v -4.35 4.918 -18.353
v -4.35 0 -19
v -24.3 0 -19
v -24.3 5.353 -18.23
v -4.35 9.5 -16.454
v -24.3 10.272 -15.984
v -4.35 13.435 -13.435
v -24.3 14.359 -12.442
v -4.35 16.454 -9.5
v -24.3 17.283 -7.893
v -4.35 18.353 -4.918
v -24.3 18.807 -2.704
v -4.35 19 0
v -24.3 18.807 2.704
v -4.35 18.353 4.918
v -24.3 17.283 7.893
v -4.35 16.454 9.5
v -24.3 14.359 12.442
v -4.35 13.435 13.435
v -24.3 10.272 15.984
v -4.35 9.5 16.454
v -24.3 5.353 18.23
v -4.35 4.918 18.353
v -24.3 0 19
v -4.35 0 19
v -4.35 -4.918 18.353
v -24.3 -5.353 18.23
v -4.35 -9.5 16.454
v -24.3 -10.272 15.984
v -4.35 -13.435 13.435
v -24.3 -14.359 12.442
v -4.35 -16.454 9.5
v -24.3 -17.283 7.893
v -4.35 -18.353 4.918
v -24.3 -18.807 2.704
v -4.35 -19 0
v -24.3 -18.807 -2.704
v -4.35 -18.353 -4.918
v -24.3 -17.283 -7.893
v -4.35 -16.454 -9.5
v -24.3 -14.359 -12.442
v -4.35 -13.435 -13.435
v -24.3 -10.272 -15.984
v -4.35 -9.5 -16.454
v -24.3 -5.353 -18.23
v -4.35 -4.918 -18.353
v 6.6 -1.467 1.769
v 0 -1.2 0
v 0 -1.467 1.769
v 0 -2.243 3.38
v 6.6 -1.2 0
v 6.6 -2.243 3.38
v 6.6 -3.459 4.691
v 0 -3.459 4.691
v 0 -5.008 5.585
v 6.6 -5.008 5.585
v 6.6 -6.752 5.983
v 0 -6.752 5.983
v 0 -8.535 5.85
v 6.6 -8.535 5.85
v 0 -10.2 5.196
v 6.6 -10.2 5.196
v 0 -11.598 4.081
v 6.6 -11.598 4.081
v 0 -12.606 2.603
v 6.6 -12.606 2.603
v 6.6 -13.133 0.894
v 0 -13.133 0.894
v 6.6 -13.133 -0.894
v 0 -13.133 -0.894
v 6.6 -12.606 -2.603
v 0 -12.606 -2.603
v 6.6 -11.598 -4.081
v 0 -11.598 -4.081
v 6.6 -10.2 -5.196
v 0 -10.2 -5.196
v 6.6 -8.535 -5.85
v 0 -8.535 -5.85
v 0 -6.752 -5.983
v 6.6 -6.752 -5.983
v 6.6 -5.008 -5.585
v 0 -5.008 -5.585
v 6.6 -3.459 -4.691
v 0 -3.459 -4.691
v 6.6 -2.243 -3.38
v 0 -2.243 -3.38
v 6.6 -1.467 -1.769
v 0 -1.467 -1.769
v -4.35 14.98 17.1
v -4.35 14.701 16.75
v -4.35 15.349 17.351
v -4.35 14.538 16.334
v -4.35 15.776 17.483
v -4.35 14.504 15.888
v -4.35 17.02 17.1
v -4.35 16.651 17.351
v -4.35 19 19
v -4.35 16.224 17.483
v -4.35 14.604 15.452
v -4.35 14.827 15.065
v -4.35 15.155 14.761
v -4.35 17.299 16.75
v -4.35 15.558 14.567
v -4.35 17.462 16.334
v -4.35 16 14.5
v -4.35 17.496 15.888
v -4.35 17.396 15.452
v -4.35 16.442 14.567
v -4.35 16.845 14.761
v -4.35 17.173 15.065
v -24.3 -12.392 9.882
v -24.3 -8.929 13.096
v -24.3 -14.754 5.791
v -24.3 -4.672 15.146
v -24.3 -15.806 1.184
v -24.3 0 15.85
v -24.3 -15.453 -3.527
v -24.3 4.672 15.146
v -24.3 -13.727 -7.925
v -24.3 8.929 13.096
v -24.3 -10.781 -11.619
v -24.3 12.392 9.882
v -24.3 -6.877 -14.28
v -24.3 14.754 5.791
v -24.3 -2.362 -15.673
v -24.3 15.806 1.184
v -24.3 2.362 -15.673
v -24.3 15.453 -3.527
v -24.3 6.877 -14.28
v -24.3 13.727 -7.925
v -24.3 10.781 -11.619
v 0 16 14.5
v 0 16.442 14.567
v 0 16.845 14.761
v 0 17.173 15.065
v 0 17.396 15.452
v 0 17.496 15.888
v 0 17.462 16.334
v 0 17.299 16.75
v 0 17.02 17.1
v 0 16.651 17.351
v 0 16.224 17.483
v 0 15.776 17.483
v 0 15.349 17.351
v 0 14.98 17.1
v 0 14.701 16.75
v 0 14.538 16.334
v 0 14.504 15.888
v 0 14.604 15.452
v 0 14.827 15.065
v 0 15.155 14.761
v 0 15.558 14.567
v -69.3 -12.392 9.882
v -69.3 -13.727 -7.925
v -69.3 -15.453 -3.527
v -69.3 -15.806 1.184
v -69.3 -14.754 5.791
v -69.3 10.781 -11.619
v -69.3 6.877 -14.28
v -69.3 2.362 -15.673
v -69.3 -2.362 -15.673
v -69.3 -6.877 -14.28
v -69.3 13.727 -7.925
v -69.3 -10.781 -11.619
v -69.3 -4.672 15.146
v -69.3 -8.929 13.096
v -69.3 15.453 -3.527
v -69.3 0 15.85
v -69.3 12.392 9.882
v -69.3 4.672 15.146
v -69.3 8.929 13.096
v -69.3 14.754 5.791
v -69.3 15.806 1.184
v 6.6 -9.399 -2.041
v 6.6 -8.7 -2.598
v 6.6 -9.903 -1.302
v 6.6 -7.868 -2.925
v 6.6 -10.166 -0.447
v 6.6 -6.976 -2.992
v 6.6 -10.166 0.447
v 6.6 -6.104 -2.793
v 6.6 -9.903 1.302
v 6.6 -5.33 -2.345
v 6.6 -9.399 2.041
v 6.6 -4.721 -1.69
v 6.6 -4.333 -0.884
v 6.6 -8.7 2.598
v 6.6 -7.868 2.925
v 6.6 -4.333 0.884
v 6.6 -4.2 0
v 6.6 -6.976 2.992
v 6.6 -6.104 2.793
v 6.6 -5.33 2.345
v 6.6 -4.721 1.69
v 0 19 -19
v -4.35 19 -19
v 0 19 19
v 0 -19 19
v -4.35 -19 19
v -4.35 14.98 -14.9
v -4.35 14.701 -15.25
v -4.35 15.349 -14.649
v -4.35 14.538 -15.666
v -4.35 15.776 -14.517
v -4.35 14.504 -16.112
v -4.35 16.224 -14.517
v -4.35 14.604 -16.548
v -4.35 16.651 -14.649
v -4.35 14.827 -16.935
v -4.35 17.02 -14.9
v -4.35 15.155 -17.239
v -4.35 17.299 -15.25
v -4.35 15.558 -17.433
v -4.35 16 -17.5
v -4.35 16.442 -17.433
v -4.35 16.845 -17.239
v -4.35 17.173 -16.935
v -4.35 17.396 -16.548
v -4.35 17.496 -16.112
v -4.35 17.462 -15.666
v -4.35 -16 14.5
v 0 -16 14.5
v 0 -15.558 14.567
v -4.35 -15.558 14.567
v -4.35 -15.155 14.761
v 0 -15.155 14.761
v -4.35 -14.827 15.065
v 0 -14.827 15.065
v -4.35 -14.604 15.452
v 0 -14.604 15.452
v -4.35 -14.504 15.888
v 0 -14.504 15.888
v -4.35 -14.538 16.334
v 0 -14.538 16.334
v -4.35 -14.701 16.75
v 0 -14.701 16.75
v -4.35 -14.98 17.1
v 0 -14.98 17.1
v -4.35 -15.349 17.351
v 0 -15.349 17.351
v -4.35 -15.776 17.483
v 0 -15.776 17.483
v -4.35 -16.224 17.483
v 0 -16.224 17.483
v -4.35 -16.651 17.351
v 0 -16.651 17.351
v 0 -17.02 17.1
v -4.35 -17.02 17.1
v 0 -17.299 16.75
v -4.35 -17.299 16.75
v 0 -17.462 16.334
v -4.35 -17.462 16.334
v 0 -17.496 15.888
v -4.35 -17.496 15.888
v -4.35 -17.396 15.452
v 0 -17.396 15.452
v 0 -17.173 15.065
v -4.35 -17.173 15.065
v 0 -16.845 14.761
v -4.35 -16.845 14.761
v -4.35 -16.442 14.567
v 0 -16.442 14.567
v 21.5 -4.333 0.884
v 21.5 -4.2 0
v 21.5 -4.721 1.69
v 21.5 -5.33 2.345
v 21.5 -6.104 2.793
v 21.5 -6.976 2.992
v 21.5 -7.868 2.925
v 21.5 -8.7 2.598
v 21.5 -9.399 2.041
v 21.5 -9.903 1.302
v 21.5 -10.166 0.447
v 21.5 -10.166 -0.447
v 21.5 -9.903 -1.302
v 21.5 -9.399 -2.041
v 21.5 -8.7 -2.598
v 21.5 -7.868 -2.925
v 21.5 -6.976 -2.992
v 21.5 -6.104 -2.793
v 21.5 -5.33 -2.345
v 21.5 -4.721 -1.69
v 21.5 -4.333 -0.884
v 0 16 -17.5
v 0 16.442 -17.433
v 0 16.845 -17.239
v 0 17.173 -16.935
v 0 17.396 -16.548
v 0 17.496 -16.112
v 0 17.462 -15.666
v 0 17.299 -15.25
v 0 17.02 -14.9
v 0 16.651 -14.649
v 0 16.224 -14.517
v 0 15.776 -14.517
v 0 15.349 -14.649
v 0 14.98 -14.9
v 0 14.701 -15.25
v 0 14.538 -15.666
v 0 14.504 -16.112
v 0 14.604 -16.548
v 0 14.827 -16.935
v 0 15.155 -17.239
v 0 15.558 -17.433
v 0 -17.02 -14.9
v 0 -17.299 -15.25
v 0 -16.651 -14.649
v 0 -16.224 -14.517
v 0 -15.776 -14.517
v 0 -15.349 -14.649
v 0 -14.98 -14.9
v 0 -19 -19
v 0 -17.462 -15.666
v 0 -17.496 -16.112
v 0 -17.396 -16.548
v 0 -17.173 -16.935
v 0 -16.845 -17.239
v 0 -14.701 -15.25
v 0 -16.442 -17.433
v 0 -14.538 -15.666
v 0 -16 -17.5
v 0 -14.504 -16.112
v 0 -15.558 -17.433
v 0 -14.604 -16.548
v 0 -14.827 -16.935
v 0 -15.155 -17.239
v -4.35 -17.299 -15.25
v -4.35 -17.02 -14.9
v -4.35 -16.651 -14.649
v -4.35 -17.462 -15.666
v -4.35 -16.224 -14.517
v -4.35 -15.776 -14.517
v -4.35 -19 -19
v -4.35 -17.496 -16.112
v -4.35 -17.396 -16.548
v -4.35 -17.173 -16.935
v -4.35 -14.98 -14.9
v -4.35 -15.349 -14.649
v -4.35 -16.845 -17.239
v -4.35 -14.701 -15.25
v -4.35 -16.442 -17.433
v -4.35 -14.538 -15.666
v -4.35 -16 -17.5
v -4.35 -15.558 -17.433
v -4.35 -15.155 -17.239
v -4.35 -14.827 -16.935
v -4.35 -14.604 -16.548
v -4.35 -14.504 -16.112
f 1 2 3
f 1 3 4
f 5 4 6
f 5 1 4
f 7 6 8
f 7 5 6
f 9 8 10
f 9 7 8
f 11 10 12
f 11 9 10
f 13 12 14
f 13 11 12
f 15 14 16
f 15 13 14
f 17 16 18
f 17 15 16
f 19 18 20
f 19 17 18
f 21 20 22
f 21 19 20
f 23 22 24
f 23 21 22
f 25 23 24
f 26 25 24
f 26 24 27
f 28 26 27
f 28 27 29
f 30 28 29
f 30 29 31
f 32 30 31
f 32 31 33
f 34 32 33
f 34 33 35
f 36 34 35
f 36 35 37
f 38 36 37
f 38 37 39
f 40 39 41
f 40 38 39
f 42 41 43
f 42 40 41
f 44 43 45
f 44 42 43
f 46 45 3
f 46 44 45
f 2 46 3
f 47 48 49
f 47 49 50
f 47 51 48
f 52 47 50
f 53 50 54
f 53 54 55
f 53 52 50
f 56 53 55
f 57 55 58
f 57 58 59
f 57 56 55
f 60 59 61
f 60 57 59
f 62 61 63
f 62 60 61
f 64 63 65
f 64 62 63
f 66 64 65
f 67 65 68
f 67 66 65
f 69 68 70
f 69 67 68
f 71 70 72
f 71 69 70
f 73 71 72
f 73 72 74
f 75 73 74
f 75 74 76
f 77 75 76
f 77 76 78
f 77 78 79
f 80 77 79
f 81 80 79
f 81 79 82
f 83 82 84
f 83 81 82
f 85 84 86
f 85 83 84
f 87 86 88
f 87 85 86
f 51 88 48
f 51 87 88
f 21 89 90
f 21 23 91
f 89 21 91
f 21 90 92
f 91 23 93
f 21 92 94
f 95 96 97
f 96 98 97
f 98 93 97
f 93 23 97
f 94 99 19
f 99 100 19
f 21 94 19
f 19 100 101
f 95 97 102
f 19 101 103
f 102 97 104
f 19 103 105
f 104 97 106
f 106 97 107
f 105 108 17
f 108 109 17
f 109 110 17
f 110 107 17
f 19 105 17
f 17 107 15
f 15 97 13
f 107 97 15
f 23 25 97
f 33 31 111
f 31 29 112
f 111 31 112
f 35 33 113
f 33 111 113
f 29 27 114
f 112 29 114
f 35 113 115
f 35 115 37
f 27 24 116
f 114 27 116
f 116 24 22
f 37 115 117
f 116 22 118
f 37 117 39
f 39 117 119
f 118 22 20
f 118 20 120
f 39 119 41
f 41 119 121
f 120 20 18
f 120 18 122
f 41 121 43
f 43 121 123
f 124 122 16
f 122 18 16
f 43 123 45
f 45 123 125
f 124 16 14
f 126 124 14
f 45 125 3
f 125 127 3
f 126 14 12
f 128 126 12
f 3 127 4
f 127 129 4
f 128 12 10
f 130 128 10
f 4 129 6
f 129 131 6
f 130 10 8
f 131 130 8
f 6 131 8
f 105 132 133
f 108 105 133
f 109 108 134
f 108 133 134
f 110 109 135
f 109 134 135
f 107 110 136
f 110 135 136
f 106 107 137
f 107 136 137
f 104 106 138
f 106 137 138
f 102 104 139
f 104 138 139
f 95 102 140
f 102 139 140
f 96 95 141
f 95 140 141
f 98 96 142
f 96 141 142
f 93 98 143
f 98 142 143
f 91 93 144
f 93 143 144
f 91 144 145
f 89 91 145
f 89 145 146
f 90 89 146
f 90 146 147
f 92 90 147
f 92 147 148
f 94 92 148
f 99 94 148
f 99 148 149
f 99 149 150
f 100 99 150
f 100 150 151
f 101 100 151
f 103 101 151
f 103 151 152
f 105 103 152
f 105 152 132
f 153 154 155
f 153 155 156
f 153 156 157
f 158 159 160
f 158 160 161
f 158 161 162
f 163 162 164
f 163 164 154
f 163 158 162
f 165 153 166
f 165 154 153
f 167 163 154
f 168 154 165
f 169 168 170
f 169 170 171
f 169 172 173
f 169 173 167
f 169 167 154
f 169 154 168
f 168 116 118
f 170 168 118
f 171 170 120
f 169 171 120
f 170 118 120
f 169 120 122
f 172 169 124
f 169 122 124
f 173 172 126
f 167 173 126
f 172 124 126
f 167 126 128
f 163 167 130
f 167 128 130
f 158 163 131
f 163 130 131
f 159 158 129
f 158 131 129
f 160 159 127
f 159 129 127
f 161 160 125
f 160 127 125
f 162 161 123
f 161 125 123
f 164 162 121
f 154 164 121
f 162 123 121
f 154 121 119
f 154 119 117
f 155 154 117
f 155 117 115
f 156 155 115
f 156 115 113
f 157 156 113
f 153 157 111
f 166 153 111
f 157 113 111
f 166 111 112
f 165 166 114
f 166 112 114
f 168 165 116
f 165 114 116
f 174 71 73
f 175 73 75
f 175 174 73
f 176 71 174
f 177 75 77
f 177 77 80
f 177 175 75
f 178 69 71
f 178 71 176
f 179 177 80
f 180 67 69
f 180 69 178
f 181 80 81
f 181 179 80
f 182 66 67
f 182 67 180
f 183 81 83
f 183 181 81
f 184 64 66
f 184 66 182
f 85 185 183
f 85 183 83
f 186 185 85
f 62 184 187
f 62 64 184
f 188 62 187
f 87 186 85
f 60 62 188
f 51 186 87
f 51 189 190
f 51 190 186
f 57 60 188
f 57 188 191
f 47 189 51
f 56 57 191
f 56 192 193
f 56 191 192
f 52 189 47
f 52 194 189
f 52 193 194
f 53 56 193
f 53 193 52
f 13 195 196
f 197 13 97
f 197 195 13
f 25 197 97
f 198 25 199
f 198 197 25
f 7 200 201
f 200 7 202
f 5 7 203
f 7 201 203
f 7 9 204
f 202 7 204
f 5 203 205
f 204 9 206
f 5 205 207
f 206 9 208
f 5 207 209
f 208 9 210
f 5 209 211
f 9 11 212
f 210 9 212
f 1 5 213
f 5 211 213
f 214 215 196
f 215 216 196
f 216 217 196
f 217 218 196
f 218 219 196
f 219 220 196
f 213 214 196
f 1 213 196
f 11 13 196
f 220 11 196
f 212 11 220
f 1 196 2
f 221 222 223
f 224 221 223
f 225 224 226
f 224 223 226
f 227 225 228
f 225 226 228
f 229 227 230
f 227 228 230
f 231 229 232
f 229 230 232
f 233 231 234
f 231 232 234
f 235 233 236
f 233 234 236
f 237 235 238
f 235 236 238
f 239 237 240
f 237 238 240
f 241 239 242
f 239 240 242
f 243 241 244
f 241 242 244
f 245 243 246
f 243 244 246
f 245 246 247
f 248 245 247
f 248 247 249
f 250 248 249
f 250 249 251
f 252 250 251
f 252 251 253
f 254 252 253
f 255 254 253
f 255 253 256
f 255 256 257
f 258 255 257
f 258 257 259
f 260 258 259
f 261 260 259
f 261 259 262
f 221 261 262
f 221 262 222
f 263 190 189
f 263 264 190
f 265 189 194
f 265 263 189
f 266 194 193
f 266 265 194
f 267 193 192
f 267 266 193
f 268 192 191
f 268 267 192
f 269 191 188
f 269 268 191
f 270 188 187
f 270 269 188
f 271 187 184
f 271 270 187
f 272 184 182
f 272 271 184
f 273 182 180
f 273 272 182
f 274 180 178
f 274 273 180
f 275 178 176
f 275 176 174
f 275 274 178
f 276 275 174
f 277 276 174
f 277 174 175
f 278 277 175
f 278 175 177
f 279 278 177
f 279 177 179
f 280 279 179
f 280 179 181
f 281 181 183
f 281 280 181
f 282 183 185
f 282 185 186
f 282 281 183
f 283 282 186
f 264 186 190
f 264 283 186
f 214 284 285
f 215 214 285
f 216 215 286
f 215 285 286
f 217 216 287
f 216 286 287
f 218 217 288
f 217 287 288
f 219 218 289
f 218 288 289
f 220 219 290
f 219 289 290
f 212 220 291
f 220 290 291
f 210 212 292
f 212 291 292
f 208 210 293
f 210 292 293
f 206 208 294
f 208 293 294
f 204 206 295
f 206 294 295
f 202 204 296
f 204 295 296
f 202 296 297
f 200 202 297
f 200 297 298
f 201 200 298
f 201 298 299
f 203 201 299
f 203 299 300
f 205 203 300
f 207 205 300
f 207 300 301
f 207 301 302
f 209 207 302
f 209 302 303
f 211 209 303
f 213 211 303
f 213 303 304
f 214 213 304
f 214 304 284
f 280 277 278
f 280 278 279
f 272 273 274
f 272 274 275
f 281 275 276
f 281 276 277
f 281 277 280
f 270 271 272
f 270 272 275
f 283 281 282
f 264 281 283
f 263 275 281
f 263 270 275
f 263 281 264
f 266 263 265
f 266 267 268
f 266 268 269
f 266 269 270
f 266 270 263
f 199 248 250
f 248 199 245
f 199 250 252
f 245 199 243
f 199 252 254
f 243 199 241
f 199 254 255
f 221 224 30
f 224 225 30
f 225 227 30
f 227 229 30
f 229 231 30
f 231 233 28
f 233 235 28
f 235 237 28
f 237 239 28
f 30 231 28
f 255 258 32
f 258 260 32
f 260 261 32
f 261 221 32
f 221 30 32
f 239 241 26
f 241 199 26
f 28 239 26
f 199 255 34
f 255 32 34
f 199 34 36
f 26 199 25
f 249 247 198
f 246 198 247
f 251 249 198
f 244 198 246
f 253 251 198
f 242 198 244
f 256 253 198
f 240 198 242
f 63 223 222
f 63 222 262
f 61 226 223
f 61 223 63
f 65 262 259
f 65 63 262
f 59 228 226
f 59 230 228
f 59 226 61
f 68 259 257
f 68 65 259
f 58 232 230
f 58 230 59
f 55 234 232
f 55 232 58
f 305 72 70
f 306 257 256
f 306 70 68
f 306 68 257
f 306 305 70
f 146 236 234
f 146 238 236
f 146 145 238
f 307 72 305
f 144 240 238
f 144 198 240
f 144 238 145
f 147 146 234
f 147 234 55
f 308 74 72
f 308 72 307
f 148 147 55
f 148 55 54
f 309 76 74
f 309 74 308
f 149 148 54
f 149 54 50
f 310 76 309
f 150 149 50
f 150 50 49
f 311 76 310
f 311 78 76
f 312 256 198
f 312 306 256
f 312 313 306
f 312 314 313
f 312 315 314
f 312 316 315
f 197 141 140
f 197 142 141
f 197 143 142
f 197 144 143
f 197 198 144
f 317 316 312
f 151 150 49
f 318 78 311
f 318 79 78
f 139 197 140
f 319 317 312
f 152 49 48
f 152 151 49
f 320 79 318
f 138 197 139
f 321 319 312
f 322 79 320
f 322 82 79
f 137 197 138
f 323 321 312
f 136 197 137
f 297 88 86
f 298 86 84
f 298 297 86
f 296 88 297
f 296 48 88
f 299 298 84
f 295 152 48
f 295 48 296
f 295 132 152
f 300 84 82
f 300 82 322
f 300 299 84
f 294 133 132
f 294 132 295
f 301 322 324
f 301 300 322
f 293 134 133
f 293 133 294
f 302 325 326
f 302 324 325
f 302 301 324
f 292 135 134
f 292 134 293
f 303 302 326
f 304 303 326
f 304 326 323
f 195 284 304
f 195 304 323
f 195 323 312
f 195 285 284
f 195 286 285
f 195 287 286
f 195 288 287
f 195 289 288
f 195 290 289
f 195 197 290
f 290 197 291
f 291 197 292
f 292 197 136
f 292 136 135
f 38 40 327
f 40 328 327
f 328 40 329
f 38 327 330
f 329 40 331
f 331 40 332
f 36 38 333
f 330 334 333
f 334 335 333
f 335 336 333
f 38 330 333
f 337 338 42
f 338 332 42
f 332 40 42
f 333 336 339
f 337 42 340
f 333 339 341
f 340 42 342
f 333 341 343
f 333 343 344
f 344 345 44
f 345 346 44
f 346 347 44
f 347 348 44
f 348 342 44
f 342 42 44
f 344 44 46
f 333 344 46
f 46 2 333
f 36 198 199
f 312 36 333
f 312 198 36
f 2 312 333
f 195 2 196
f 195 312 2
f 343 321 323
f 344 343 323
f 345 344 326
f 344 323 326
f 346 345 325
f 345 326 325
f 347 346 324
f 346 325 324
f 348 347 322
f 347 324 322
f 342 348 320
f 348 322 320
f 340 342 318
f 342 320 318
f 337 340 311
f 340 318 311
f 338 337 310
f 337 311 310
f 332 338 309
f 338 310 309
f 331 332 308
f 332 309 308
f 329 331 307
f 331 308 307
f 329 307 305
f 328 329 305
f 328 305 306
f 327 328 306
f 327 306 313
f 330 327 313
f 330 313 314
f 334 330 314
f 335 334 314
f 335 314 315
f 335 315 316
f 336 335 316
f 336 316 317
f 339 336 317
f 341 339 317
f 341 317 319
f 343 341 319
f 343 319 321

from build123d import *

# Parameters (mm, degrees)
BOSS_EXTRUDE1_DEPTH   = 24.3
BOSS_EXTRUDE2_DEPTH   = 4.35
SKETCH2_R             = 15.85
BOSS_EXTRUDE3_DEPTH   = 45
CORTE_EXTRUS_O1_REACH = 76.327
ESBO_O3_R             = 1.5


with BuildPart() as part:
    # Sketch1 → Boss-Extrude1 (new body)
    with BuildSketch(Plane(origin=(0, 0, 0), x_dir=(0, 0, -1), z_dir=(1, 0, 0))):
        with BuildLine():
            ThreePointArc((19, 0), (13.435028855, 13.43502883), (3.5e-08, 19))
            ThreePointArc((3.5e-08, 19), (-13.435028834, 13.435028851), (-19, -9e-09))
            ThreePointArc((-19, -9e-09), (-13.435028829, -13.435028856), (2.8e-08, -19))
            ThreePointArc((2.8e-08, -19), (13.435028852, -13.435028833), (19, 0))
        make_face()
    extrude(amount=-BOSS_EXTRUDE1_DEPTH)

    # Sketch1<3> → Boss-Extrude2 (add)
    with BuildSketch(Plane(origin=(0, 0, 0), x_dir=(0, 0, -1), z_dir=(1, 0, 0))):
        with BuildLine():
            Line((3.5e-08, 19), (-19, 19))
            Line((-19, 19), (-19, -9e-09))
            ThreePointArc((-19, -9e-09), (-13.435028834, 13.435028851), (3.5e-08, 19))
        make_face()
        with BuildLine():
            Line((19, 19), (3.5e-08, 19))
            ThreePointArc((3.5e-08, 19), (13.435028855, 13.43502883), (19, 0))
            Line((19, 0), (19, 19))
        make_face()
        with BuildLine():
            ThreePointArc((2.8e-08, -19), (-13.435028829, -13.435028856), (-19, -9e-09))
            Line((-19, -9e-09), (-19, -19))
            Line((-19, -19), (2.8e-08, -19))
        make_face()
        with BuildLine():
            Line((19, -19), (19, 0))
            ThreePointArc((19, 0), (13.435028852, -13.435028833), (2.8e-08, -19))
            Line((2.8e-08, -19), (19, -19))
        make_face()
    extrude(amount=-BOSS_EXTRUDE2_DEPTH)

    # Sketch2 → Boss-Extrude3 (add)
    with BuildSketch(Plane.ZY.offset(24.3)):
        Circle(SKETCH2_R)
    extrude(amount=BOSS_EXTRUDE3_DEPTH)

    # Esboço2 → Revolução1 (revolve)
    with BuildSketch(Plane.XY):
        Polygon((0, -1.2), (6.6, -1.2), (6.6, -4.2), (21.5, -4.2), (21.5, -7.2), (0, -7.2), align=None)
    revolve(axis=Axis((0, -7.2, 0), (1, 0, 0)))

    # Esboço3 → Corte-extrusão1 (cut, up to next)
    with BuildSketch(Plane(origin=(0, 0, 0), x_dir=(0, 0, -1), z_dir=(1, 0, 0)), mode=Mode.PRIVATE) as corte_extrus_o1_sk1:
        with Locations((-16, 16)):
            Circle(ESBO_O3_R)
    corte_extrus_o1_tool1 = extrude(corte_extrus_o1_sk1.sketch, amount=-CORTE_EXTRUS_O1_REACH, mode=Mode.PRIVATE) & part.part
    # Esboço3 → Corte-extrusão1 (cut, up to next)
    with BuildSketch(Plane(origin=(0, 0, 0), x_dir=(0, 0, -1), z_dir=(1, 0, 0)), mode=Mode.PRIVATE) as corte_extrus_o1_sk2:
        with Locations((16, 16)):
            Circle(ESBO_O3_R)
    corte_extrus_o1_tool2 = extrude(corte_extrus_o1_sk2.sketch, amount=-CORTE_EXTRUS_O1_REACH, mode=Mode.PRIVATE) & part.part
    # Esboço3 → Corte-extrusão1 (cut, up to next)
    with BuildSketch(Plane(origin=(0, 0, 0), x_dir=(0, 0, -1), z_dir=(1, 0, 0)), mode=Mode.PRIVATE) as corte_extrus_o1_sk3:
        with Locations((16, -16)):
            Circle(ESBO_O3_R)
    corte_extrus_o1_tool3 = extrude(corte_extrus_o1_sk3.sketch, amount=-CORTE_EXTRUS_O1_REACH, mode=Mode.PRIVATE) & part.part
    # Esboço3 → Corte-extrusão1 (cut, up to next)
    with BuildSketch(Plane(origin=(0, 0, 0), x_dir=(0, 0, -1), z_dir=(1, 0, 0)), mode=Mode.PRIVATE) as corte_extrus_o1_sk4:
        with Locations((-16, -16)):
            Circle(ESBO_O3_R)
    corte_extrus_o1_tool4 = extrude(corte_extrus_o1_sk4.sketch, amount=-CORTE_EXTRUS_O1_REACH, mode=Mode.PRIVATE) & part.part
    add(corte_extrus_o1_tool1.solids().sort_by_distance((0, 16, 16))[0], mode=Mode.SUBTRACT)
    add(corte_extrus_o1_tool2.solids().sort_by_distance((0, 16, -16))[0], mode=Mode.SUBTRACT)
    add(corte_extrus_o1_tool3.solids().sort_by_distance((0, -16, -16))[0], mode=Mode.SUBTRACT)
    add(corte_extrus_o1_tool4.solids().sort_by_distance((0, -16, 16))[0], mode=Mode.SUBTRACT)


solid = part.part
